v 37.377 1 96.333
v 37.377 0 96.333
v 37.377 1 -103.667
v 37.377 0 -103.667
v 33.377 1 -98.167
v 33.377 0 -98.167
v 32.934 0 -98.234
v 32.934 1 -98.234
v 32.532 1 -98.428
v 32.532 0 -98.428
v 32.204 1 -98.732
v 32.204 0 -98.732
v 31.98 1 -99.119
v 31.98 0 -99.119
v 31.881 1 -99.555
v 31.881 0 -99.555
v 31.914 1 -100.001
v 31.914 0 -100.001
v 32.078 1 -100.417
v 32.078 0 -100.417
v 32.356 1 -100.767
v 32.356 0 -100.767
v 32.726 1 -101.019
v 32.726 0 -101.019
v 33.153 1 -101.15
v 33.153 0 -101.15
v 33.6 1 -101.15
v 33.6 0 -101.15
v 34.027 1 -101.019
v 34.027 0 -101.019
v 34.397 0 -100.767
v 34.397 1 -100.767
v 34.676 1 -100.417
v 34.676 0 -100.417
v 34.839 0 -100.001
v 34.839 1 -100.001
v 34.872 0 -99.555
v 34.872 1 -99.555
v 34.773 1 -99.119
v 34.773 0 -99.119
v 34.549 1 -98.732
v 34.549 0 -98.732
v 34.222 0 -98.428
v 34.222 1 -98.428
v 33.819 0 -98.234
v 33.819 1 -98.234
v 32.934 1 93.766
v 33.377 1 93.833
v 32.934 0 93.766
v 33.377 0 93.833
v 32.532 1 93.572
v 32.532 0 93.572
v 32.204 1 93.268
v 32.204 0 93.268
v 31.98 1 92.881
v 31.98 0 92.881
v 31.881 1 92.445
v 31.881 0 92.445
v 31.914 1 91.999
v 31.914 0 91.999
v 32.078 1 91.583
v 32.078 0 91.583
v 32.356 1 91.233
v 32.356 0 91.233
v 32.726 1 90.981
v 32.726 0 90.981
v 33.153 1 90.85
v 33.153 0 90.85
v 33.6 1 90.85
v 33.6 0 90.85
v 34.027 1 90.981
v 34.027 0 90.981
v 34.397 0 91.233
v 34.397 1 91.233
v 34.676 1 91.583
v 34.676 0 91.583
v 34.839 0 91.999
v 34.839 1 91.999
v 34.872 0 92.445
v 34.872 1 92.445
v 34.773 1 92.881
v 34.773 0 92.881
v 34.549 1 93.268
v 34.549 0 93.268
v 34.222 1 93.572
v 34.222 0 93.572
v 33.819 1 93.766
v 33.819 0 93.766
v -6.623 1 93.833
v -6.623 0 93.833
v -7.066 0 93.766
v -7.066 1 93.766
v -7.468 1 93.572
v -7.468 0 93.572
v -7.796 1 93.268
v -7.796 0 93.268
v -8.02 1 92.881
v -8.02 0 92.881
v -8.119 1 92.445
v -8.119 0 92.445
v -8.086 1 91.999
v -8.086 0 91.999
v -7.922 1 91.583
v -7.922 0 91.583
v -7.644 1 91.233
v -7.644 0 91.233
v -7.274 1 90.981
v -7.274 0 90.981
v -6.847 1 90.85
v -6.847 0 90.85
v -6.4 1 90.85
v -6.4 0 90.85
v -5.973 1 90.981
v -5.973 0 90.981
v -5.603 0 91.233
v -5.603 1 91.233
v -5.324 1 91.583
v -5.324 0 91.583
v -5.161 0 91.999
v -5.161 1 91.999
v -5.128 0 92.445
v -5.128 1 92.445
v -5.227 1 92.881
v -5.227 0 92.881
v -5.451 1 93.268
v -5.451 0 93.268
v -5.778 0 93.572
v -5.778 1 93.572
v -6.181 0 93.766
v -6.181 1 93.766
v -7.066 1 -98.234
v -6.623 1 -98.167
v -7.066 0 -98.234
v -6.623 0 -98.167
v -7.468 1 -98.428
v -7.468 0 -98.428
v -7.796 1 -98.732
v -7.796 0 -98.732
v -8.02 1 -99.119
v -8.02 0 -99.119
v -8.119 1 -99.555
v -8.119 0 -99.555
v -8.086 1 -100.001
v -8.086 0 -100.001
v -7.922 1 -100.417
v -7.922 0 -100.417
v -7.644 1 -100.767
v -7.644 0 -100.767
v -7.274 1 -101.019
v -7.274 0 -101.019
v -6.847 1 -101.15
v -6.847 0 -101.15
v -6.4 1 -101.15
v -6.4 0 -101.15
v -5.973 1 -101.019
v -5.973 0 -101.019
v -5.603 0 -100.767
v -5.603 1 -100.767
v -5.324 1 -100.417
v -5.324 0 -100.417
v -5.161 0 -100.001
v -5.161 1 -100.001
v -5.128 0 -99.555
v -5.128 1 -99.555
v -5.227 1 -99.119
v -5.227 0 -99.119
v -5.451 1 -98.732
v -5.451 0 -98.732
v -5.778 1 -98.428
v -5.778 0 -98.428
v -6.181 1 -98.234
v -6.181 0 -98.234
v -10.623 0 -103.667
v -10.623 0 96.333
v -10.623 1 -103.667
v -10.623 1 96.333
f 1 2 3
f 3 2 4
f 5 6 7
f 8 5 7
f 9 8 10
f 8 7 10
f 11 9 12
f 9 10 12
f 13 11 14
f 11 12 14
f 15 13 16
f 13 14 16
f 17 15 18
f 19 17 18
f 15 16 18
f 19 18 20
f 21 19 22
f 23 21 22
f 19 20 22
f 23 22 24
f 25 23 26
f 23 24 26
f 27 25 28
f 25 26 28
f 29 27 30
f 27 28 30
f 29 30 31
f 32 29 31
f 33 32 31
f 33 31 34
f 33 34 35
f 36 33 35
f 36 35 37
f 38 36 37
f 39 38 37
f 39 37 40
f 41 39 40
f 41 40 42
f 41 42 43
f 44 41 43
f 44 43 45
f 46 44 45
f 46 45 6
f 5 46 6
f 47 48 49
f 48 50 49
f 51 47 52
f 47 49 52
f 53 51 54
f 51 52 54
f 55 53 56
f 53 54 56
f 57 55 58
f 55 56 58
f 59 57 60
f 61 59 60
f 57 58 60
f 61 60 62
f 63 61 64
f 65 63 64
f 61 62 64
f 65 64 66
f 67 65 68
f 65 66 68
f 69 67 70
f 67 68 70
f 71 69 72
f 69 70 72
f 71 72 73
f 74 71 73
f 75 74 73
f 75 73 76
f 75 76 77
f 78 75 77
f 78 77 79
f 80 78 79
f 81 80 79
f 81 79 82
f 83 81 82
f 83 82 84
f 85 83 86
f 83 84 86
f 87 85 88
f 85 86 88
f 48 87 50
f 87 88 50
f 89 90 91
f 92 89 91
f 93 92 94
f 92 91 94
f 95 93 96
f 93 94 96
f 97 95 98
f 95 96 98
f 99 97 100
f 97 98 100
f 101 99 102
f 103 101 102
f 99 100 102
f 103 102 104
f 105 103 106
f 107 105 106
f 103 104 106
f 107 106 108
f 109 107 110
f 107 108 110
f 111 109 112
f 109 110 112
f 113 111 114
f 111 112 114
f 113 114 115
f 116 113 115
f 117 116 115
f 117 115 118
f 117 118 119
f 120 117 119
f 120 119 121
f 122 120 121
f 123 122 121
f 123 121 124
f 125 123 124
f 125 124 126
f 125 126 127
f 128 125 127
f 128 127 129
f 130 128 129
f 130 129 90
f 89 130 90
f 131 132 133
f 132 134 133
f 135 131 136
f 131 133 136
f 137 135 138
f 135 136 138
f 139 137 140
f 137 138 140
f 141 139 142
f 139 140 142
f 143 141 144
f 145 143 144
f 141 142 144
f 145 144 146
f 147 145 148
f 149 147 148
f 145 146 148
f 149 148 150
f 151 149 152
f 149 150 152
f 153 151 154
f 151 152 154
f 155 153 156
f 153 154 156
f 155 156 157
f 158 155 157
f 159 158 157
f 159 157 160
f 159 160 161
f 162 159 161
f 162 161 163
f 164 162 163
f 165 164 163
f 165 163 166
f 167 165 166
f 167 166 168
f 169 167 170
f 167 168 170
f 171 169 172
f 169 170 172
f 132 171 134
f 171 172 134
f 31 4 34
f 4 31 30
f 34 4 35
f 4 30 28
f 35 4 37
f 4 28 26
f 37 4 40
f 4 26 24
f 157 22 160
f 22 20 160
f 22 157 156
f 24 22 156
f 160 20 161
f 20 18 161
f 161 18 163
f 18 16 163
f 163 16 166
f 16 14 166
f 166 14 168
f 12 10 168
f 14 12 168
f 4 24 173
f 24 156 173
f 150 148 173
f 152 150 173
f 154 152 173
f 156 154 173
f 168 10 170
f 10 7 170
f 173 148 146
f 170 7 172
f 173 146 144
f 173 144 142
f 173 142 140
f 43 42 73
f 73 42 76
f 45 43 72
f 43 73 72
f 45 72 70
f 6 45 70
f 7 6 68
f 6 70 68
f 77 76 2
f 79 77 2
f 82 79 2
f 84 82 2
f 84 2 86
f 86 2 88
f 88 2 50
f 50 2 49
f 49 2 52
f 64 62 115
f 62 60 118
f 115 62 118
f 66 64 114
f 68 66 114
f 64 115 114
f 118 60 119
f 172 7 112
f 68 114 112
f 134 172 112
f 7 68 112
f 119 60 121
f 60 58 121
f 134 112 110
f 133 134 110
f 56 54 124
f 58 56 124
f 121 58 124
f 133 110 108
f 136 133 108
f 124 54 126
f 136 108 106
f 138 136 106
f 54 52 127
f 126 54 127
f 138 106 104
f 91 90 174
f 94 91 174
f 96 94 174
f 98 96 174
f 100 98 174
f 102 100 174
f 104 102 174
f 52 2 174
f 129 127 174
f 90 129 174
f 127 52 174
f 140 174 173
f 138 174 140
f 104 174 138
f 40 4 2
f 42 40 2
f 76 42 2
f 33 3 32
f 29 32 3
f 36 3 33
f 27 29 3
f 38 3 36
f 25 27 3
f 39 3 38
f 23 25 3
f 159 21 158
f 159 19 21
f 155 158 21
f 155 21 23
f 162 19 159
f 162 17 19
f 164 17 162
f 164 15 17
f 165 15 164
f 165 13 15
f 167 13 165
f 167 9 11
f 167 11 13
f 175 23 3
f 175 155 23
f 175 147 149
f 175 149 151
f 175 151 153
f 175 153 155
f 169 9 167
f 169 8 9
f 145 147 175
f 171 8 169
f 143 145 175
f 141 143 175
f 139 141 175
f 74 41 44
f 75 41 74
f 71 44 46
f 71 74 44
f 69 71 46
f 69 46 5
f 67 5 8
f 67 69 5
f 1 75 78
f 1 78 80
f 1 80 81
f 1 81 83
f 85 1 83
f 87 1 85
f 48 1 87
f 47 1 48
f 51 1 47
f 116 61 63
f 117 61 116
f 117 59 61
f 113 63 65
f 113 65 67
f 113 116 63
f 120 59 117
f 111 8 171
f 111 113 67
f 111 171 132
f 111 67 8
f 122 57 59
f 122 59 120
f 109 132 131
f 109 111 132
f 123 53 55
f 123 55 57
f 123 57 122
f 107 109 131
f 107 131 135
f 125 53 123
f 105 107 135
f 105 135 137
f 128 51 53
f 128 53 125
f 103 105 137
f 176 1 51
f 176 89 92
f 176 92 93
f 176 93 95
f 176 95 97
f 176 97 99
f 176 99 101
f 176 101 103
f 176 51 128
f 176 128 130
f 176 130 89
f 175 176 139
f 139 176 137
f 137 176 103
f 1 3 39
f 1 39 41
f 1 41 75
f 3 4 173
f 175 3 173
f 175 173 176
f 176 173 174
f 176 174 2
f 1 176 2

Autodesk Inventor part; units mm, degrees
ref_plane "YZ Plane" through (0, 0, 0) normal (1, 0, 0) x (0, 1, 0)
ref_plane "XZ Plane" through (0, 0, 0) normal (0, 1, 0) x (-1, 0, 0)
ref_plane "XY Plane" through (0, 0, 0) normal (0, 0, 1) x (1, 0, 0)
sketch "Sketch1" plane through (0, 0, 0) normal (0, 1, 0) x (-1, 0, 0)
  line L0 (10.6234, 96.3329) -> (-37.3766, 96.3329)
  line L1 (-37.3766, 96.3329) -> (-37.3766, -103.6671)
  line L2 (-37.3766, -103.6671) -> (10.6234, -103.6671)
  line L3 (10.6234, -103.6671) -> (10.6234, 96.3329)
  point P0 (0, 0)
  dimension "d0" = 200
  dimension "d1" = 48
extrude "Extrusion1" add sketch "Sketch1" along normal blind 1
sketch "Sketch2" plane through (0, 1, 0) normal (0, 1, 0) x (1, 0, 0)
  line L0 (-10.6234, 103.6671) -> (-10.6234, -96.3329) projected
  line L1 (37.3766, -96.3329) -> (37.3766, 103.6671) projected
  line L2 (-10.6234, -96.3329) -> (37.3766, -96.3329) projected
  line L3 (37.3766, 103.6671) -> (-10.6234, 103.6671) projected
  point P0 (0, 0)
  point P1 (-6.6234, -92.3329)
  point P2 (33.3766, -92.3329)
  point P3 (33.3766, 99.6671)
  point P4 (-6.6234, 99.6671)
  dimension "d4" = 0
  dimension "d5" = 0
  dimension "d6" = 0
  dimension "d7" = 0
  dimension "d8" = 4
  dimension "d9" = 4
  dimension "d10" = 4
  dimension "d11" = 4
hole "Hole1" at (-6.6234, 1, 92.3329) at (33.3766, 1, 92.3329) at (33.3766, 1, -99.6671) at (-6.6234, 1, -99.6671) direction (0, -1, 0) diameter 3 depth 25.4 tip angle 118.188
equation "\"d1\" = BoardWidth"
equation "\"d2\" = BoardHeight"
equation "\"d8\" = ScrewHoleOffset"
equation "\"d9\" = ScrewHoleOffset"
equation "\"d10\" = ScrewHoleOffset"
equation "\"d11\" = ScrewHoleOffset"
equation "\"d12\" = ScrewSize"
equation "\"BoardLength\" = 556"
equation "\"BoardWidth\" = 48"
equation "\"ScrewSize\" = 3"
equation "\"ScrewHoleOffset\" = 4"
equation "\"BoardGap\" = 4"
equation "\"BoardHeight\" = 1"
equation "\"HorizOffsetBetweenScrews\" = 192"
equation "\"BaseWidth\" = 556"
equation "\"BaseLength\" = 648"
equation "\"TwoBoardWidth\" = 444"
equation "\"NumberOfRows\" = 254"
equation "\"NumberOfGaps\" = 228.6"
properties part number "PRT1001-210 1U Board"
